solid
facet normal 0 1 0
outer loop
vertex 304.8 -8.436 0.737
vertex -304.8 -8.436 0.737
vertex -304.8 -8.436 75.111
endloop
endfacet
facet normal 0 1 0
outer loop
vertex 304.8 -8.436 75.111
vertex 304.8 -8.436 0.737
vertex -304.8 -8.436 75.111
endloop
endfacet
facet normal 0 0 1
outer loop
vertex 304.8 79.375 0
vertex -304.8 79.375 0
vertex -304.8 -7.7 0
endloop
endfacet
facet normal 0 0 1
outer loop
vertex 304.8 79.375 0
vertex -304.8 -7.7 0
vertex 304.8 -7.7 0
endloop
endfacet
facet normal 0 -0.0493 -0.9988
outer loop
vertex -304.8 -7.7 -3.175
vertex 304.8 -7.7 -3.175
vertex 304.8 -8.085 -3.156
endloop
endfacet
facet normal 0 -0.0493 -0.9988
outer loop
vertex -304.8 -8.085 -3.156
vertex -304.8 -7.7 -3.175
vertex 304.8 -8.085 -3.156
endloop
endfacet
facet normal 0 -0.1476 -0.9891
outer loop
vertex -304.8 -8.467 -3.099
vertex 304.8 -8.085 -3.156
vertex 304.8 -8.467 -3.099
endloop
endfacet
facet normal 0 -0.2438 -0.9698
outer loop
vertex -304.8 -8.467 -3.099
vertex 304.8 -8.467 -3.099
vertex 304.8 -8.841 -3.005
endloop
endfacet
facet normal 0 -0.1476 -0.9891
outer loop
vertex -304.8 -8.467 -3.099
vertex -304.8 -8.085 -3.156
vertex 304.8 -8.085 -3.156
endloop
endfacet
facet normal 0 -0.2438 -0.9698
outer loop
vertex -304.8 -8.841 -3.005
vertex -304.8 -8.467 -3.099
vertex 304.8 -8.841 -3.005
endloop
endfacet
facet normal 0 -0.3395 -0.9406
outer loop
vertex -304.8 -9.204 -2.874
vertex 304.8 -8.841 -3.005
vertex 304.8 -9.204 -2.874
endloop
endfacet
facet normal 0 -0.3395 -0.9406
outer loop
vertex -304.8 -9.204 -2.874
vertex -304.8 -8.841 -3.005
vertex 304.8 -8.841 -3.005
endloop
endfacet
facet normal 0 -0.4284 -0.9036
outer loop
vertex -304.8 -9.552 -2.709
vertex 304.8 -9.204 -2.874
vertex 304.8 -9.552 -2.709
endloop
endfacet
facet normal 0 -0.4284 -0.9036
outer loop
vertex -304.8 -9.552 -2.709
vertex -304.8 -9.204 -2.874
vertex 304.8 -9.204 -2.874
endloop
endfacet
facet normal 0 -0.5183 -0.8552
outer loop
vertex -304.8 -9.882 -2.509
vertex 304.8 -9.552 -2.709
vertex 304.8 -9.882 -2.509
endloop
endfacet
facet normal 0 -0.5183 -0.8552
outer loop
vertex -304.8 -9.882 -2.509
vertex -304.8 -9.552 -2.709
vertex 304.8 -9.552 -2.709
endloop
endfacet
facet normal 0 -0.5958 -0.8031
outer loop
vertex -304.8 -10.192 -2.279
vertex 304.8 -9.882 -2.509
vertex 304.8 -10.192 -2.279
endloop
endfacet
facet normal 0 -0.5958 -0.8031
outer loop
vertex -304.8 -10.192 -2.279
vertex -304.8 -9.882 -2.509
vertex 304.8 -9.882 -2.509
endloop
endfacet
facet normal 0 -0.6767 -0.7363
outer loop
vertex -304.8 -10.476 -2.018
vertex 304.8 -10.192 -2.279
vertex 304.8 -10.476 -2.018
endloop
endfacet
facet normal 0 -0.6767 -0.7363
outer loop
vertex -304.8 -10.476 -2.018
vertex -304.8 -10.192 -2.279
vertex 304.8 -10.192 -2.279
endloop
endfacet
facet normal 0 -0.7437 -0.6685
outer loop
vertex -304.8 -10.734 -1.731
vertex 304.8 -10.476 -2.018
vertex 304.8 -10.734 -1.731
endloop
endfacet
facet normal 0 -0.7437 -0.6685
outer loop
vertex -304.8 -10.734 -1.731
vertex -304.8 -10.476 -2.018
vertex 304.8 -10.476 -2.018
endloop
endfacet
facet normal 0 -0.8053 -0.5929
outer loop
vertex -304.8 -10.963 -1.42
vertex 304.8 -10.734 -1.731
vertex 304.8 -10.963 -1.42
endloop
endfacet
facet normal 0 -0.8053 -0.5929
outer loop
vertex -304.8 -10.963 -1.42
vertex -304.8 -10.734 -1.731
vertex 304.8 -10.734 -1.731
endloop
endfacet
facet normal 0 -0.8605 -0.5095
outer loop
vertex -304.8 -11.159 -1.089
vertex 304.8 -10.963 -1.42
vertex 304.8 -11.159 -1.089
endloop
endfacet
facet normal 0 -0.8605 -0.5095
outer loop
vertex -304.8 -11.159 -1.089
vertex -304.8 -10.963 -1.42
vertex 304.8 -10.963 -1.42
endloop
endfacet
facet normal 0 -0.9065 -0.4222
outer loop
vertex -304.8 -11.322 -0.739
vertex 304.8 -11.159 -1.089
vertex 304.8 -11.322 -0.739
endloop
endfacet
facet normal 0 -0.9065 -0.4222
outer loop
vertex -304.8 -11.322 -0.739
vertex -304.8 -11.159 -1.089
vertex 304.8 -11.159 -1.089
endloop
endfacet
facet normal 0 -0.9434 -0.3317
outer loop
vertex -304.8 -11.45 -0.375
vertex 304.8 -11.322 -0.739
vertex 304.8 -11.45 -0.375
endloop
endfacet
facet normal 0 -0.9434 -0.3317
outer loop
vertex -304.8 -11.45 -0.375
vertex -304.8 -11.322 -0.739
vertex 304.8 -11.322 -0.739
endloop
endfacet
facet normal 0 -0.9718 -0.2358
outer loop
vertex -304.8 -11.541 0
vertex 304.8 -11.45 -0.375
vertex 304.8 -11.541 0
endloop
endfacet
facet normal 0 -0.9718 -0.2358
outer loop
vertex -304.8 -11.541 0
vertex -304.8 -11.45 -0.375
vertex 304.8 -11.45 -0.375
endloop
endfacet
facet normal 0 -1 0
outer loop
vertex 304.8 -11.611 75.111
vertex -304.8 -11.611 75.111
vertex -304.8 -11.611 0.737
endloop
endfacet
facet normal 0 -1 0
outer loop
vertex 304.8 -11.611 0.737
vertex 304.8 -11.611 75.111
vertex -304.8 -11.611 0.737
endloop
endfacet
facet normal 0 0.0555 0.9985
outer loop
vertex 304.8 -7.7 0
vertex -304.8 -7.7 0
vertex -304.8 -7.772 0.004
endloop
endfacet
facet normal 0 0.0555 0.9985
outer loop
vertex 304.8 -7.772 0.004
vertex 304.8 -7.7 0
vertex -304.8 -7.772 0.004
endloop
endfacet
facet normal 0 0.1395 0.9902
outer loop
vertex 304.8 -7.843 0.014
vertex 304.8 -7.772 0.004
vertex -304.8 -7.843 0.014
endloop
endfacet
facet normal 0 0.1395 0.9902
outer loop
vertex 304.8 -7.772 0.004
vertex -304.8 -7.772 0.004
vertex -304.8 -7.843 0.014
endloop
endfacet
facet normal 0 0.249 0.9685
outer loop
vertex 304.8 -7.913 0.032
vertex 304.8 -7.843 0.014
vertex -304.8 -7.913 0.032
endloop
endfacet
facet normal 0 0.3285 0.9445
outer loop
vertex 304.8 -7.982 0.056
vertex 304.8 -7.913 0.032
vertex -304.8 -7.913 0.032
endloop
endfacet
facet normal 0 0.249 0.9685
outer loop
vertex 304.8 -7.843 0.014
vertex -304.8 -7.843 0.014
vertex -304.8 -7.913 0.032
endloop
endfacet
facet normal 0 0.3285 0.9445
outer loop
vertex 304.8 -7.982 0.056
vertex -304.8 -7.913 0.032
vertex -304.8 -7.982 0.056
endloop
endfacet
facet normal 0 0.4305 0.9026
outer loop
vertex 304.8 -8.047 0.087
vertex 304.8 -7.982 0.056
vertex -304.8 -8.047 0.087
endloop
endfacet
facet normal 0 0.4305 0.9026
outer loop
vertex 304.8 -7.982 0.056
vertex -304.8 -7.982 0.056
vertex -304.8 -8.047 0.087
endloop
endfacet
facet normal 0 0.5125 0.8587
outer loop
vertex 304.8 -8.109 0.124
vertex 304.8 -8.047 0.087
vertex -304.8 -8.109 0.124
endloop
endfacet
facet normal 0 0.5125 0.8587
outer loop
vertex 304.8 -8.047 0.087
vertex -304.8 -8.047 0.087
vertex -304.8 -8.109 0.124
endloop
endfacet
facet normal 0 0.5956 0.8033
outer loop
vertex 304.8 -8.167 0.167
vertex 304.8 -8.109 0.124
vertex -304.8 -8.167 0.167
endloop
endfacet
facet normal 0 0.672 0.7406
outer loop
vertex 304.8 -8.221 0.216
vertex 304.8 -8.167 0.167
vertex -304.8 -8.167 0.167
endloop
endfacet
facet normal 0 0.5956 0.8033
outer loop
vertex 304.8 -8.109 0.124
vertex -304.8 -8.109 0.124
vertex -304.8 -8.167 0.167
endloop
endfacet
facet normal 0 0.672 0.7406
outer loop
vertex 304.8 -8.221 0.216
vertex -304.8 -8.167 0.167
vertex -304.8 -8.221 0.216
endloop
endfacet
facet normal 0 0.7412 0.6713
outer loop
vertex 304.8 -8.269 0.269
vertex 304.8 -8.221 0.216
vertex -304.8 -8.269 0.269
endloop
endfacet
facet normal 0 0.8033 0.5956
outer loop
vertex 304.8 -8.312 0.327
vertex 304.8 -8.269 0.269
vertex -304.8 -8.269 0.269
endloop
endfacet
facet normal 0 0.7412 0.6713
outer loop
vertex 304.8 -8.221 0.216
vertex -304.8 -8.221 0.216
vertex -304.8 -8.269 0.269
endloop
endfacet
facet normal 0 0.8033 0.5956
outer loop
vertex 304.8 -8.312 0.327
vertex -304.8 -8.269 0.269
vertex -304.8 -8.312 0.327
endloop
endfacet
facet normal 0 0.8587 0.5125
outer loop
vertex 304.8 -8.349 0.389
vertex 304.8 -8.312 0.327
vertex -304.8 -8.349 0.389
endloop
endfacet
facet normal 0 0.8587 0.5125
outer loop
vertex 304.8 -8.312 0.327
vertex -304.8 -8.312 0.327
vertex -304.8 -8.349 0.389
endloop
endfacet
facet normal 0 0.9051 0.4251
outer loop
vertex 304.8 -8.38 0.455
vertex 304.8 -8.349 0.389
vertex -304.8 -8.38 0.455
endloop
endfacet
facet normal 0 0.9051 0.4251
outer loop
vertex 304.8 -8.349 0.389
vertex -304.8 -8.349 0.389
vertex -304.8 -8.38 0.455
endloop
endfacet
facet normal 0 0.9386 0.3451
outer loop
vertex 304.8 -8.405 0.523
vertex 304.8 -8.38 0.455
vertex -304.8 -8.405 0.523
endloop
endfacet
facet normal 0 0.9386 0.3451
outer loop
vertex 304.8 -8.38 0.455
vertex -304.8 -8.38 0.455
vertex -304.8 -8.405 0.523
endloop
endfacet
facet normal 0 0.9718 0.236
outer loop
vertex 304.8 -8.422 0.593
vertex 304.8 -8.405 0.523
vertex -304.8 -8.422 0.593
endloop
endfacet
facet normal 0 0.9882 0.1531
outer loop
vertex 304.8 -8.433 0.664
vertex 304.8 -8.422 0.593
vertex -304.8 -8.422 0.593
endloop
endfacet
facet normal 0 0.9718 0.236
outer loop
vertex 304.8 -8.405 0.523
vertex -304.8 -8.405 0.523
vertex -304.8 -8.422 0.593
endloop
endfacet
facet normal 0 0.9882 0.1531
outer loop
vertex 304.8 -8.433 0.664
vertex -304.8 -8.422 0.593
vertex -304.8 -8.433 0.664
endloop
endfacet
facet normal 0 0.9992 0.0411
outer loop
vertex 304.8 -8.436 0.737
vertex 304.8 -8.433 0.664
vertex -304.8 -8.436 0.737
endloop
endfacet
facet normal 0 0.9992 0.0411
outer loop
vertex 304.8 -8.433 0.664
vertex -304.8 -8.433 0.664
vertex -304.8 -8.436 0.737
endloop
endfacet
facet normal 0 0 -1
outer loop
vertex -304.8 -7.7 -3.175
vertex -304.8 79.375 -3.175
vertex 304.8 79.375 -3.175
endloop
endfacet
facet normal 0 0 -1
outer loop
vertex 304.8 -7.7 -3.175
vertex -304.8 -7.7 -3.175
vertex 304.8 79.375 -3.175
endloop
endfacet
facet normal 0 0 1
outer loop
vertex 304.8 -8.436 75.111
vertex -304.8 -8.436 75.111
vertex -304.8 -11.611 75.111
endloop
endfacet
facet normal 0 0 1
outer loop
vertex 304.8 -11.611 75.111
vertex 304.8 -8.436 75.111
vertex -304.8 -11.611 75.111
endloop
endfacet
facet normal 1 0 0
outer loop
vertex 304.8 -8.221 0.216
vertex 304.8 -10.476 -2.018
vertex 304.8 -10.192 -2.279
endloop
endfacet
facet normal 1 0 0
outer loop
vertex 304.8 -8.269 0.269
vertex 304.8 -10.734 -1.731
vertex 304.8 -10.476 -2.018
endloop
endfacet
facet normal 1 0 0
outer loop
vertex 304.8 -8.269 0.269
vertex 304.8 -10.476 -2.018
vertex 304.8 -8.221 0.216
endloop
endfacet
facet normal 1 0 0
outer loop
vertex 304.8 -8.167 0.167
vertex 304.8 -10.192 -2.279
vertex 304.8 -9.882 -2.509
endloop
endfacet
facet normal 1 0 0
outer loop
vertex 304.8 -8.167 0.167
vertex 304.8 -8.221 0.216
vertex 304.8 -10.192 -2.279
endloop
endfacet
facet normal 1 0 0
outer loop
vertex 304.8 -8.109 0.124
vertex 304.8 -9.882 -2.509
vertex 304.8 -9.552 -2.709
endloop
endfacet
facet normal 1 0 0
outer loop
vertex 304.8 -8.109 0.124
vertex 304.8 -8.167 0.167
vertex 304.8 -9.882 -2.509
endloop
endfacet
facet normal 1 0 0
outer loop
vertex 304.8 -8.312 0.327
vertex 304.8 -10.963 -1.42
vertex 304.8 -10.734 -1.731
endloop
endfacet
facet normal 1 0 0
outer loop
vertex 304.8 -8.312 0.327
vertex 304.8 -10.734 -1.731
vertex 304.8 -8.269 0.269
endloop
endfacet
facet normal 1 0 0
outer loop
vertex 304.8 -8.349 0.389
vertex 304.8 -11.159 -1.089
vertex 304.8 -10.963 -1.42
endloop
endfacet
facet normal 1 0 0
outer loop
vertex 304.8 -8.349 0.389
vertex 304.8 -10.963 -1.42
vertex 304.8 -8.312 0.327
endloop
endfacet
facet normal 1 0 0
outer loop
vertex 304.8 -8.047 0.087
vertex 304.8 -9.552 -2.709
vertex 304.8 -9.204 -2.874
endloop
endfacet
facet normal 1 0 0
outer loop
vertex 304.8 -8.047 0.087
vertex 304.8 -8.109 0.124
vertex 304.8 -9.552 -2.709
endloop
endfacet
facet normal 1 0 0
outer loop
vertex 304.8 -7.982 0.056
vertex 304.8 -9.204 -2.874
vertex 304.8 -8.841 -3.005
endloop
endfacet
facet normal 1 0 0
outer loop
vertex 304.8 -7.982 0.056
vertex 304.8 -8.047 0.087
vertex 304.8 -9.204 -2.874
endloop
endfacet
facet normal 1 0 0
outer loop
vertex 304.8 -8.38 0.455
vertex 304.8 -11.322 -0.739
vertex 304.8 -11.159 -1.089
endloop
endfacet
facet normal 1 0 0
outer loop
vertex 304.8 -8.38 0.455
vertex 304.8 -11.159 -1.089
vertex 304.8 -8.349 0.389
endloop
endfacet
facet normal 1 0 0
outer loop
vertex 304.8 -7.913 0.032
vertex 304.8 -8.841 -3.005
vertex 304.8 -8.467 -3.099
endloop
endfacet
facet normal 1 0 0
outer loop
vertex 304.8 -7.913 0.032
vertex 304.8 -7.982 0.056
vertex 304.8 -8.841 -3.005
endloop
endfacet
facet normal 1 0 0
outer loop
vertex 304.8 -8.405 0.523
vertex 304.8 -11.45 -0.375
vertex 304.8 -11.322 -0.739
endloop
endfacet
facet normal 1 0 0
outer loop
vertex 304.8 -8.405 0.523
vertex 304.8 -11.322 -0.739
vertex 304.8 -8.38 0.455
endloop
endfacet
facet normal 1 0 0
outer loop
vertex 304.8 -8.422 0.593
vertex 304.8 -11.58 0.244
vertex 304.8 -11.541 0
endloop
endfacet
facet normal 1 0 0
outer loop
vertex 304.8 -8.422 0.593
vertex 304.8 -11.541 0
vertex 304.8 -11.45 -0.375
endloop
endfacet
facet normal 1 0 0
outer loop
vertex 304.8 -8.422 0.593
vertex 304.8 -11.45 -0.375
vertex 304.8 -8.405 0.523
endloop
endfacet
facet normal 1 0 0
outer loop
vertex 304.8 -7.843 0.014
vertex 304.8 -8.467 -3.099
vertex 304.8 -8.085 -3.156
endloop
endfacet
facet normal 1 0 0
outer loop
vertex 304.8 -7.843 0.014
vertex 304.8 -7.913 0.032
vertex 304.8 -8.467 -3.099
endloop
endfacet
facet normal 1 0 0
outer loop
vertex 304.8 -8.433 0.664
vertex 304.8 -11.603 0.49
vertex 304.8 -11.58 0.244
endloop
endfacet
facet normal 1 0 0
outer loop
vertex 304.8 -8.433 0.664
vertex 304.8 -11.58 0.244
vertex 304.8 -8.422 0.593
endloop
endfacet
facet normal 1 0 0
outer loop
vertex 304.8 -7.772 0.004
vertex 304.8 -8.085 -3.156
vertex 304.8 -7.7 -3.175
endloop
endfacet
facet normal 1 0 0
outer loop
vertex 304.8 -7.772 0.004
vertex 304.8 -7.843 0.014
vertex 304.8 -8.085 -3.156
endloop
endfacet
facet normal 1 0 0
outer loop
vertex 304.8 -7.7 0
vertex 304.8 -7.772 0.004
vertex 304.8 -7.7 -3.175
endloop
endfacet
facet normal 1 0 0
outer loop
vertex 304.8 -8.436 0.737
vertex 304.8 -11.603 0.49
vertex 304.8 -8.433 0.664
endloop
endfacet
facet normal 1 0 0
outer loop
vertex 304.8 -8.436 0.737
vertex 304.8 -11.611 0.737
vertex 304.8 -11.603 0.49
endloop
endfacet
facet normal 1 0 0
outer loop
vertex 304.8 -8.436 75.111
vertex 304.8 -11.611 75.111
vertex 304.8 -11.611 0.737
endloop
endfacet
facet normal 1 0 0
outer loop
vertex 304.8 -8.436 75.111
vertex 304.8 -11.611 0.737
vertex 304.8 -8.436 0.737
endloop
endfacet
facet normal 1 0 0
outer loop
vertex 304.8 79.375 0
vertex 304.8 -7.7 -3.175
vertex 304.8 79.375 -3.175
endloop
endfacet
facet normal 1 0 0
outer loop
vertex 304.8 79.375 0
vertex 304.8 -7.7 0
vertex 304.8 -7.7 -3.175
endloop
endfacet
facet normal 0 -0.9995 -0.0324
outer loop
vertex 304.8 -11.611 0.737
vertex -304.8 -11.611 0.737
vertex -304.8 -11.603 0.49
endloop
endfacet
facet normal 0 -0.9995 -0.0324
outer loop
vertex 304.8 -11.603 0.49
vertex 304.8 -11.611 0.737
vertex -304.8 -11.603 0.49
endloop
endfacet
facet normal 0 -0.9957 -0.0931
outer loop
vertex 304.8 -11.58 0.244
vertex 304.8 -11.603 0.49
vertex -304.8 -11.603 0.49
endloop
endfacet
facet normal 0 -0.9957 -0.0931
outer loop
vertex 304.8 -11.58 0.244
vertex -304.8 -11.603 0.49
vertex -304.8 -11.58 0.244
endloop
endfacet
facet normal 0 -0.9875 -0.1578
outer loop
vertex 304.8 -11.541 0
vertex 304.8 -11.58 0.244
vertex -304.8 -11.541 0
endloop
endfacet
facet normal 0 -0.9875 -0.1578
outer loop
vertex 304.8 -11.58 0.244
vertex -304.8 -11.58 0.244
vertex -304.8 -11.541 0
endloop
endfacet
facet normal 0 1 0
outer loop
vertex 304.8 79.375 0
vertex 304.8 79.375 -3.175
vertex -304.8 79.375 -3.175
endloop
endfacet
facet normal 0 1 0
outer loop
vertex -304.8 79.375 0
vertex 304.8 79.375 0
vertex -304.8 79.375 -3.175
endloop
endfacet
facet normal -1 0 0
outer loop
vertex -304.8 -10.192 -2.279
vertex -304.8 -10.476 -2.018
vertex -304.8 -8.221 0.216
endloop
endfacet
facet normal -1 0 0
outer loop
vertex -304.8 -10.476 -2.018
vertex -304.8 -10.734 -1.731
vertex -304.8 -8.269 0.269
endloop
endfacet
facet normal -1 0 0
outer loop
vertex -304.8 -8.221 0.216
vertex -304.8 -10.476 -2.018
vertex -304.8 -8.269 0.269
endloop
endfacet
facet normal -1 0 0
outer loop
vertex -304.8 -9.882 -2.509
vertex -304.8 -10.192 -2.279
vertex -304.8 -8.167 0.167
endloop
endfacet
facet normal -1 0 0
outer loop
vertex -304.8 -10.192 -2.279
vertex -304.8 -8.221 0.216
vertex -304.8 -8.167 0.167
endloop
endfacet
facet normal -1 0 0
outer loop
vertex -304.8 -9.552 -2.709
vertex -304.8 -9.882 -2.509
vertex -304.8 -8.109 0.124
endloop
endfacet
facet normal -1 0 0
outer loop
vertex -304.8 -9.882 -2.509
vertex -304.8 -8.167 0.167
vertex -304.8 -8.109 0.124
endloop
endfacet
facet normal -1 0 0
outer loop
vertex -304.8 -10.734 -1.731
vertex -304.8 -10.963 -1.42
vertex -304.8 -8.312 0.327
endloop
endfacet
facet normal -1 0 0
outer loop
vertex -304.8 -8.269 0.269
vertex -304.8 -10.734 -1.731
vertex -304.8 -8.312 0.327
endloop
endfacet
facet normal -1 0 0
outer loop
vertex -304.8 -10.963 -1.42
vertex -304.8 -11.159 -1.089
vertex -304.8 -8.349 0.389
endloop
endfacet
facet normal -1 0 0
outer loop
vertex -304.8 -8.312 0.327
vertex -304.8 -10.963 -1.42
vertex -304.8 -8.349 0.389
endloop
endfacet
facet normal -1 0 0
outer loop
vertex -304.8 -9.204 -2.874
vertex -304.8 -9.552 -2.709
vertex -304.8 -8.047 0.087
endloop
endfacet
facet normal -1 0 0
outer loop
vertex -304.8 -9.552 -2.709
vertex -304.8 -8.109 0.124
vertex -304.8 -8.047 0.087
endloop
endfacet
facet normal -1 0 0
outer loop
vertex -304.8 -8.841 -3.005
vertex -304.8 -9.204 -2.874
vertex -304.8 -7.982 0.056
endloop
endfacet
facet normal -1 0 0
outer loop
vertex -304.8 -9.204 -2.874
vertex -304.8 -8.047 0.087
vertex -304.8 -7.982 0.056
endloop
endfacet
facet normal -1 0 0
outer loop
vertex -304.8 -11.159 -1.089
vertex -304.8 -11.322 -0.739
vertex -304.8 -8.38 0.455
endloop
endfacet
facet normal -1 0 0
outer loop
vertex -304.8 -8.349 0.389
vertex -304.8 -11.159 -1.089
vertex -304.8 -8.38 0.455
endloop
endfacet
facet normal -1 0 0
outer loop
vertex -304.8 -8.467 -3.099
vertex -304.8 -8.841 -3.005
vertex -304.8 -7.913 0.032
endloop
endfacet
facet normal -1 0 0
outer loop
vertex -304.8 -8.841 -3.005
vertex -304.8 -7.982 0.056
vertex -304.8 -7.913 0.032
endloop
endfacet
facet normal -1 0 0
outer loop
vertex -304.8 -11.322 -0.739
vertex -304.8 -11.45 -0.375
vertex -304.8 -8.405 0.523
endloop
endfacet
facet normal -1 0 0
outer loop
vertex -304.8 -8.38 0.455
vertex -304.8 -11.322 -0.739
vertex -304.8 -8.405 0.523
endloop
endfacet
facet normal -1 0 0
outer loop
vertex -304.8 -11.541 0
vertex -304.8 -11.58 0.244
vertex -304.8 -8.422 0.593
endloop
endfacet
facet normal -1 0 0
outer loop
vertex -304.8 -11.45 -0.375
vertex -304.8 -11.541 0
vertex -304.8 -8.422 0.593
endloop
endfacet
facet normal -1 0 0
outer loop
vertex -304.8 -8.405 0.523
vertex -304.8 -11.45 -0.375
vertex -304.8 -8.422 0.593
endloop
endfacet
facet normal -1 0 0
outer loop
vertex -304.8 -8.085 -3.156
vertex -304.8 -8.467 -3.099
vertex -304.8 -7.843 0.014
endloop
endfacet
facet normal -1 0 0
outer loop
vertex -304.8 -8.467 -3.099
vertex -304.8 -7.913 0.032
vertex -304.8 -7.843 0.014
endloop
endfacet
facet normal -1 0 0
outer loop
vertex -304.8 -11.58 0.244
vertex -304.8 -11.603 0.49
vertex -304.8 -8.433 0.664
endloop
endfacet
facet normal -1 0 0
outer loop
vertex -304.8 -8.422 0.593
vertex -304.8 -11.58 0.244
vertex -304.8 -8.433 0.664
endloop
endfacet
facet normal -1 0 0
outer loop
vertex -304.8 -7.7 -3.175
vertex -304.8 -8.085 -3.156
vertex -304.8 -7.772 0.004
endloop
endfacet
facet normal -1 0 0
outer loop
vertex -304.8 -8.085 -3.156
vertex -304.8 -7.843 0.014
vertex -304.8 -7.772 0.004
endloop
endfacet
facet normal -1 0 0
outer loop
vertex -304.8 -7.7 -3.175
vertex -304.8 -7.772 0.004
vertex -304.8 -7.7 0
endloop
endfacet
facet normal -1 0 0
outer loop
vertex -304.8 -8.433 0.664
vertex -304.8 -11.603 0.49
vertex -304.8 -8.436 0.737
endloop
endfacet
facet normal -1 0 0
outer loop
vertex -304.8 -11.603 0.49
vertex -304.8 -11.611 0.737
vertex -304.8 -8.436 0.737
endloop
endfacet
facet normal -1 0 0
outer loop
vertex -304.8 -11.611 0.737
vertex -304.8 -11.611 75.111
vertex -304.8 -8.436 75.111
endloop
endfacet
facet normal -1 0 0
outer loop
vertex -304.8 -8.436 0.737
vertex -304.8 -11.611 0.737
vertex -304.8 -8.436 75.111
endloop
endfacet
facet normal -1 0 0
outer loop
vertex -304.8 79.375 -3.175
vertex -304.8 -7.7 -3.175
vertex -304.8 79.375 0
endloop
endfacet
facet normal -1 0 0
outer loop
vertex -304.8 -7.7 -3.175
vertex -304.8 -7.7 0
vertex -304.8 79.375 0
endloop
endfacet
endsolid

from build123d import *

# Parameters (mm, degrees)
SKETCH8_W              = 609.6
SKETCH8_H              = 171.45
BASE_FLANGE3_DEPTH     = 3.175
SKETCHED_START         = -304.8
SKETCHED_BEND3_DEPTH   = 609.6
SKETCHED_BEND3_2_DEPTH = 609.6
SKETCH19_W             = 609.6
SKETCH19_H             = 6.35
CUT_EXTRUDE1_DEPTH     = 327.160318745


# Read off the part's stored shape, not the designer's step: Sketched Bend3
# Sheet-metal steps are written as plain solids
with BuildPart() as part:
    # Sketch8 → Base-Flange3 (new body)
    with BuildSketch(Plane.XY):
        Rectangle(SKETCH8_W, SKETCH8_H)
    extrude(amount=-BASE_FLANGE3_DEPTH)

    # Sketched Bend3 outline → Sketched Bend3 (cut)
    with BuildSketch(Plane.YZ.offset(SKETCHED_START)):
        with BuildLine():
            ThreePointArc((-7.699656128, -3.175), (-10.191576071, -2.278520157), (-11.541274928, 0))
            Line((-11.541274928, 0), (-85.725, 0))
            Line((-85.725, 0), (-85.725, -3.175))
            Line((-85.725, -3.175), (-7.699656128, -3.175))
        make_face()
    extrude(amount=SKETCHED_BEND3_DEPTH, mode=Mode.SUBTRACT)

    # Sketched Bend3 2 outline → Sketched Bend3 2 (add)
    with BuildSketch(Plane.YZ.offset(SKETCHED_START)):
        with BuildLine():
            Line((-8.436256128, 75.111256128), (-11.611256128, 75.111256128))
            Line((-11.611256128, 75.111256128), (-11.611256128, 0.7366))
            ThreePointArc((-11.611256128, 0.7366), (-11.593721527, 0.366641581), (-11.541274928, 0))
            Line((-11.541274928, 0), (-7.699656128, 0))
            ThreePointArc((-7.699656128, 0), (-8.220510983, 0.215745145), (-8.436256128, 0.7366))
            Line((-8.436256128, 0.7366), (-8.436256128, 75.111256128))
        make_face()
    extrude(amount=SKETCHED_BEND3_2_DEPTH)

    # Sketch19 → Cut-Extrude1 (cut, through all)
    with BuildSketch(Plane(origin=(0, 0, -3.175), x_dir=(-1, 0, 0), z_dir=(0, 0, -1))):
        with Locations((0, 82.55)):
            Rectangle(SKETCH19_W, SKETCH19_H)
    extrude(amount=-CUT_EXTRUDE1_DEPTH, mode=Mode.SUBTRACT)


solid = part.part
